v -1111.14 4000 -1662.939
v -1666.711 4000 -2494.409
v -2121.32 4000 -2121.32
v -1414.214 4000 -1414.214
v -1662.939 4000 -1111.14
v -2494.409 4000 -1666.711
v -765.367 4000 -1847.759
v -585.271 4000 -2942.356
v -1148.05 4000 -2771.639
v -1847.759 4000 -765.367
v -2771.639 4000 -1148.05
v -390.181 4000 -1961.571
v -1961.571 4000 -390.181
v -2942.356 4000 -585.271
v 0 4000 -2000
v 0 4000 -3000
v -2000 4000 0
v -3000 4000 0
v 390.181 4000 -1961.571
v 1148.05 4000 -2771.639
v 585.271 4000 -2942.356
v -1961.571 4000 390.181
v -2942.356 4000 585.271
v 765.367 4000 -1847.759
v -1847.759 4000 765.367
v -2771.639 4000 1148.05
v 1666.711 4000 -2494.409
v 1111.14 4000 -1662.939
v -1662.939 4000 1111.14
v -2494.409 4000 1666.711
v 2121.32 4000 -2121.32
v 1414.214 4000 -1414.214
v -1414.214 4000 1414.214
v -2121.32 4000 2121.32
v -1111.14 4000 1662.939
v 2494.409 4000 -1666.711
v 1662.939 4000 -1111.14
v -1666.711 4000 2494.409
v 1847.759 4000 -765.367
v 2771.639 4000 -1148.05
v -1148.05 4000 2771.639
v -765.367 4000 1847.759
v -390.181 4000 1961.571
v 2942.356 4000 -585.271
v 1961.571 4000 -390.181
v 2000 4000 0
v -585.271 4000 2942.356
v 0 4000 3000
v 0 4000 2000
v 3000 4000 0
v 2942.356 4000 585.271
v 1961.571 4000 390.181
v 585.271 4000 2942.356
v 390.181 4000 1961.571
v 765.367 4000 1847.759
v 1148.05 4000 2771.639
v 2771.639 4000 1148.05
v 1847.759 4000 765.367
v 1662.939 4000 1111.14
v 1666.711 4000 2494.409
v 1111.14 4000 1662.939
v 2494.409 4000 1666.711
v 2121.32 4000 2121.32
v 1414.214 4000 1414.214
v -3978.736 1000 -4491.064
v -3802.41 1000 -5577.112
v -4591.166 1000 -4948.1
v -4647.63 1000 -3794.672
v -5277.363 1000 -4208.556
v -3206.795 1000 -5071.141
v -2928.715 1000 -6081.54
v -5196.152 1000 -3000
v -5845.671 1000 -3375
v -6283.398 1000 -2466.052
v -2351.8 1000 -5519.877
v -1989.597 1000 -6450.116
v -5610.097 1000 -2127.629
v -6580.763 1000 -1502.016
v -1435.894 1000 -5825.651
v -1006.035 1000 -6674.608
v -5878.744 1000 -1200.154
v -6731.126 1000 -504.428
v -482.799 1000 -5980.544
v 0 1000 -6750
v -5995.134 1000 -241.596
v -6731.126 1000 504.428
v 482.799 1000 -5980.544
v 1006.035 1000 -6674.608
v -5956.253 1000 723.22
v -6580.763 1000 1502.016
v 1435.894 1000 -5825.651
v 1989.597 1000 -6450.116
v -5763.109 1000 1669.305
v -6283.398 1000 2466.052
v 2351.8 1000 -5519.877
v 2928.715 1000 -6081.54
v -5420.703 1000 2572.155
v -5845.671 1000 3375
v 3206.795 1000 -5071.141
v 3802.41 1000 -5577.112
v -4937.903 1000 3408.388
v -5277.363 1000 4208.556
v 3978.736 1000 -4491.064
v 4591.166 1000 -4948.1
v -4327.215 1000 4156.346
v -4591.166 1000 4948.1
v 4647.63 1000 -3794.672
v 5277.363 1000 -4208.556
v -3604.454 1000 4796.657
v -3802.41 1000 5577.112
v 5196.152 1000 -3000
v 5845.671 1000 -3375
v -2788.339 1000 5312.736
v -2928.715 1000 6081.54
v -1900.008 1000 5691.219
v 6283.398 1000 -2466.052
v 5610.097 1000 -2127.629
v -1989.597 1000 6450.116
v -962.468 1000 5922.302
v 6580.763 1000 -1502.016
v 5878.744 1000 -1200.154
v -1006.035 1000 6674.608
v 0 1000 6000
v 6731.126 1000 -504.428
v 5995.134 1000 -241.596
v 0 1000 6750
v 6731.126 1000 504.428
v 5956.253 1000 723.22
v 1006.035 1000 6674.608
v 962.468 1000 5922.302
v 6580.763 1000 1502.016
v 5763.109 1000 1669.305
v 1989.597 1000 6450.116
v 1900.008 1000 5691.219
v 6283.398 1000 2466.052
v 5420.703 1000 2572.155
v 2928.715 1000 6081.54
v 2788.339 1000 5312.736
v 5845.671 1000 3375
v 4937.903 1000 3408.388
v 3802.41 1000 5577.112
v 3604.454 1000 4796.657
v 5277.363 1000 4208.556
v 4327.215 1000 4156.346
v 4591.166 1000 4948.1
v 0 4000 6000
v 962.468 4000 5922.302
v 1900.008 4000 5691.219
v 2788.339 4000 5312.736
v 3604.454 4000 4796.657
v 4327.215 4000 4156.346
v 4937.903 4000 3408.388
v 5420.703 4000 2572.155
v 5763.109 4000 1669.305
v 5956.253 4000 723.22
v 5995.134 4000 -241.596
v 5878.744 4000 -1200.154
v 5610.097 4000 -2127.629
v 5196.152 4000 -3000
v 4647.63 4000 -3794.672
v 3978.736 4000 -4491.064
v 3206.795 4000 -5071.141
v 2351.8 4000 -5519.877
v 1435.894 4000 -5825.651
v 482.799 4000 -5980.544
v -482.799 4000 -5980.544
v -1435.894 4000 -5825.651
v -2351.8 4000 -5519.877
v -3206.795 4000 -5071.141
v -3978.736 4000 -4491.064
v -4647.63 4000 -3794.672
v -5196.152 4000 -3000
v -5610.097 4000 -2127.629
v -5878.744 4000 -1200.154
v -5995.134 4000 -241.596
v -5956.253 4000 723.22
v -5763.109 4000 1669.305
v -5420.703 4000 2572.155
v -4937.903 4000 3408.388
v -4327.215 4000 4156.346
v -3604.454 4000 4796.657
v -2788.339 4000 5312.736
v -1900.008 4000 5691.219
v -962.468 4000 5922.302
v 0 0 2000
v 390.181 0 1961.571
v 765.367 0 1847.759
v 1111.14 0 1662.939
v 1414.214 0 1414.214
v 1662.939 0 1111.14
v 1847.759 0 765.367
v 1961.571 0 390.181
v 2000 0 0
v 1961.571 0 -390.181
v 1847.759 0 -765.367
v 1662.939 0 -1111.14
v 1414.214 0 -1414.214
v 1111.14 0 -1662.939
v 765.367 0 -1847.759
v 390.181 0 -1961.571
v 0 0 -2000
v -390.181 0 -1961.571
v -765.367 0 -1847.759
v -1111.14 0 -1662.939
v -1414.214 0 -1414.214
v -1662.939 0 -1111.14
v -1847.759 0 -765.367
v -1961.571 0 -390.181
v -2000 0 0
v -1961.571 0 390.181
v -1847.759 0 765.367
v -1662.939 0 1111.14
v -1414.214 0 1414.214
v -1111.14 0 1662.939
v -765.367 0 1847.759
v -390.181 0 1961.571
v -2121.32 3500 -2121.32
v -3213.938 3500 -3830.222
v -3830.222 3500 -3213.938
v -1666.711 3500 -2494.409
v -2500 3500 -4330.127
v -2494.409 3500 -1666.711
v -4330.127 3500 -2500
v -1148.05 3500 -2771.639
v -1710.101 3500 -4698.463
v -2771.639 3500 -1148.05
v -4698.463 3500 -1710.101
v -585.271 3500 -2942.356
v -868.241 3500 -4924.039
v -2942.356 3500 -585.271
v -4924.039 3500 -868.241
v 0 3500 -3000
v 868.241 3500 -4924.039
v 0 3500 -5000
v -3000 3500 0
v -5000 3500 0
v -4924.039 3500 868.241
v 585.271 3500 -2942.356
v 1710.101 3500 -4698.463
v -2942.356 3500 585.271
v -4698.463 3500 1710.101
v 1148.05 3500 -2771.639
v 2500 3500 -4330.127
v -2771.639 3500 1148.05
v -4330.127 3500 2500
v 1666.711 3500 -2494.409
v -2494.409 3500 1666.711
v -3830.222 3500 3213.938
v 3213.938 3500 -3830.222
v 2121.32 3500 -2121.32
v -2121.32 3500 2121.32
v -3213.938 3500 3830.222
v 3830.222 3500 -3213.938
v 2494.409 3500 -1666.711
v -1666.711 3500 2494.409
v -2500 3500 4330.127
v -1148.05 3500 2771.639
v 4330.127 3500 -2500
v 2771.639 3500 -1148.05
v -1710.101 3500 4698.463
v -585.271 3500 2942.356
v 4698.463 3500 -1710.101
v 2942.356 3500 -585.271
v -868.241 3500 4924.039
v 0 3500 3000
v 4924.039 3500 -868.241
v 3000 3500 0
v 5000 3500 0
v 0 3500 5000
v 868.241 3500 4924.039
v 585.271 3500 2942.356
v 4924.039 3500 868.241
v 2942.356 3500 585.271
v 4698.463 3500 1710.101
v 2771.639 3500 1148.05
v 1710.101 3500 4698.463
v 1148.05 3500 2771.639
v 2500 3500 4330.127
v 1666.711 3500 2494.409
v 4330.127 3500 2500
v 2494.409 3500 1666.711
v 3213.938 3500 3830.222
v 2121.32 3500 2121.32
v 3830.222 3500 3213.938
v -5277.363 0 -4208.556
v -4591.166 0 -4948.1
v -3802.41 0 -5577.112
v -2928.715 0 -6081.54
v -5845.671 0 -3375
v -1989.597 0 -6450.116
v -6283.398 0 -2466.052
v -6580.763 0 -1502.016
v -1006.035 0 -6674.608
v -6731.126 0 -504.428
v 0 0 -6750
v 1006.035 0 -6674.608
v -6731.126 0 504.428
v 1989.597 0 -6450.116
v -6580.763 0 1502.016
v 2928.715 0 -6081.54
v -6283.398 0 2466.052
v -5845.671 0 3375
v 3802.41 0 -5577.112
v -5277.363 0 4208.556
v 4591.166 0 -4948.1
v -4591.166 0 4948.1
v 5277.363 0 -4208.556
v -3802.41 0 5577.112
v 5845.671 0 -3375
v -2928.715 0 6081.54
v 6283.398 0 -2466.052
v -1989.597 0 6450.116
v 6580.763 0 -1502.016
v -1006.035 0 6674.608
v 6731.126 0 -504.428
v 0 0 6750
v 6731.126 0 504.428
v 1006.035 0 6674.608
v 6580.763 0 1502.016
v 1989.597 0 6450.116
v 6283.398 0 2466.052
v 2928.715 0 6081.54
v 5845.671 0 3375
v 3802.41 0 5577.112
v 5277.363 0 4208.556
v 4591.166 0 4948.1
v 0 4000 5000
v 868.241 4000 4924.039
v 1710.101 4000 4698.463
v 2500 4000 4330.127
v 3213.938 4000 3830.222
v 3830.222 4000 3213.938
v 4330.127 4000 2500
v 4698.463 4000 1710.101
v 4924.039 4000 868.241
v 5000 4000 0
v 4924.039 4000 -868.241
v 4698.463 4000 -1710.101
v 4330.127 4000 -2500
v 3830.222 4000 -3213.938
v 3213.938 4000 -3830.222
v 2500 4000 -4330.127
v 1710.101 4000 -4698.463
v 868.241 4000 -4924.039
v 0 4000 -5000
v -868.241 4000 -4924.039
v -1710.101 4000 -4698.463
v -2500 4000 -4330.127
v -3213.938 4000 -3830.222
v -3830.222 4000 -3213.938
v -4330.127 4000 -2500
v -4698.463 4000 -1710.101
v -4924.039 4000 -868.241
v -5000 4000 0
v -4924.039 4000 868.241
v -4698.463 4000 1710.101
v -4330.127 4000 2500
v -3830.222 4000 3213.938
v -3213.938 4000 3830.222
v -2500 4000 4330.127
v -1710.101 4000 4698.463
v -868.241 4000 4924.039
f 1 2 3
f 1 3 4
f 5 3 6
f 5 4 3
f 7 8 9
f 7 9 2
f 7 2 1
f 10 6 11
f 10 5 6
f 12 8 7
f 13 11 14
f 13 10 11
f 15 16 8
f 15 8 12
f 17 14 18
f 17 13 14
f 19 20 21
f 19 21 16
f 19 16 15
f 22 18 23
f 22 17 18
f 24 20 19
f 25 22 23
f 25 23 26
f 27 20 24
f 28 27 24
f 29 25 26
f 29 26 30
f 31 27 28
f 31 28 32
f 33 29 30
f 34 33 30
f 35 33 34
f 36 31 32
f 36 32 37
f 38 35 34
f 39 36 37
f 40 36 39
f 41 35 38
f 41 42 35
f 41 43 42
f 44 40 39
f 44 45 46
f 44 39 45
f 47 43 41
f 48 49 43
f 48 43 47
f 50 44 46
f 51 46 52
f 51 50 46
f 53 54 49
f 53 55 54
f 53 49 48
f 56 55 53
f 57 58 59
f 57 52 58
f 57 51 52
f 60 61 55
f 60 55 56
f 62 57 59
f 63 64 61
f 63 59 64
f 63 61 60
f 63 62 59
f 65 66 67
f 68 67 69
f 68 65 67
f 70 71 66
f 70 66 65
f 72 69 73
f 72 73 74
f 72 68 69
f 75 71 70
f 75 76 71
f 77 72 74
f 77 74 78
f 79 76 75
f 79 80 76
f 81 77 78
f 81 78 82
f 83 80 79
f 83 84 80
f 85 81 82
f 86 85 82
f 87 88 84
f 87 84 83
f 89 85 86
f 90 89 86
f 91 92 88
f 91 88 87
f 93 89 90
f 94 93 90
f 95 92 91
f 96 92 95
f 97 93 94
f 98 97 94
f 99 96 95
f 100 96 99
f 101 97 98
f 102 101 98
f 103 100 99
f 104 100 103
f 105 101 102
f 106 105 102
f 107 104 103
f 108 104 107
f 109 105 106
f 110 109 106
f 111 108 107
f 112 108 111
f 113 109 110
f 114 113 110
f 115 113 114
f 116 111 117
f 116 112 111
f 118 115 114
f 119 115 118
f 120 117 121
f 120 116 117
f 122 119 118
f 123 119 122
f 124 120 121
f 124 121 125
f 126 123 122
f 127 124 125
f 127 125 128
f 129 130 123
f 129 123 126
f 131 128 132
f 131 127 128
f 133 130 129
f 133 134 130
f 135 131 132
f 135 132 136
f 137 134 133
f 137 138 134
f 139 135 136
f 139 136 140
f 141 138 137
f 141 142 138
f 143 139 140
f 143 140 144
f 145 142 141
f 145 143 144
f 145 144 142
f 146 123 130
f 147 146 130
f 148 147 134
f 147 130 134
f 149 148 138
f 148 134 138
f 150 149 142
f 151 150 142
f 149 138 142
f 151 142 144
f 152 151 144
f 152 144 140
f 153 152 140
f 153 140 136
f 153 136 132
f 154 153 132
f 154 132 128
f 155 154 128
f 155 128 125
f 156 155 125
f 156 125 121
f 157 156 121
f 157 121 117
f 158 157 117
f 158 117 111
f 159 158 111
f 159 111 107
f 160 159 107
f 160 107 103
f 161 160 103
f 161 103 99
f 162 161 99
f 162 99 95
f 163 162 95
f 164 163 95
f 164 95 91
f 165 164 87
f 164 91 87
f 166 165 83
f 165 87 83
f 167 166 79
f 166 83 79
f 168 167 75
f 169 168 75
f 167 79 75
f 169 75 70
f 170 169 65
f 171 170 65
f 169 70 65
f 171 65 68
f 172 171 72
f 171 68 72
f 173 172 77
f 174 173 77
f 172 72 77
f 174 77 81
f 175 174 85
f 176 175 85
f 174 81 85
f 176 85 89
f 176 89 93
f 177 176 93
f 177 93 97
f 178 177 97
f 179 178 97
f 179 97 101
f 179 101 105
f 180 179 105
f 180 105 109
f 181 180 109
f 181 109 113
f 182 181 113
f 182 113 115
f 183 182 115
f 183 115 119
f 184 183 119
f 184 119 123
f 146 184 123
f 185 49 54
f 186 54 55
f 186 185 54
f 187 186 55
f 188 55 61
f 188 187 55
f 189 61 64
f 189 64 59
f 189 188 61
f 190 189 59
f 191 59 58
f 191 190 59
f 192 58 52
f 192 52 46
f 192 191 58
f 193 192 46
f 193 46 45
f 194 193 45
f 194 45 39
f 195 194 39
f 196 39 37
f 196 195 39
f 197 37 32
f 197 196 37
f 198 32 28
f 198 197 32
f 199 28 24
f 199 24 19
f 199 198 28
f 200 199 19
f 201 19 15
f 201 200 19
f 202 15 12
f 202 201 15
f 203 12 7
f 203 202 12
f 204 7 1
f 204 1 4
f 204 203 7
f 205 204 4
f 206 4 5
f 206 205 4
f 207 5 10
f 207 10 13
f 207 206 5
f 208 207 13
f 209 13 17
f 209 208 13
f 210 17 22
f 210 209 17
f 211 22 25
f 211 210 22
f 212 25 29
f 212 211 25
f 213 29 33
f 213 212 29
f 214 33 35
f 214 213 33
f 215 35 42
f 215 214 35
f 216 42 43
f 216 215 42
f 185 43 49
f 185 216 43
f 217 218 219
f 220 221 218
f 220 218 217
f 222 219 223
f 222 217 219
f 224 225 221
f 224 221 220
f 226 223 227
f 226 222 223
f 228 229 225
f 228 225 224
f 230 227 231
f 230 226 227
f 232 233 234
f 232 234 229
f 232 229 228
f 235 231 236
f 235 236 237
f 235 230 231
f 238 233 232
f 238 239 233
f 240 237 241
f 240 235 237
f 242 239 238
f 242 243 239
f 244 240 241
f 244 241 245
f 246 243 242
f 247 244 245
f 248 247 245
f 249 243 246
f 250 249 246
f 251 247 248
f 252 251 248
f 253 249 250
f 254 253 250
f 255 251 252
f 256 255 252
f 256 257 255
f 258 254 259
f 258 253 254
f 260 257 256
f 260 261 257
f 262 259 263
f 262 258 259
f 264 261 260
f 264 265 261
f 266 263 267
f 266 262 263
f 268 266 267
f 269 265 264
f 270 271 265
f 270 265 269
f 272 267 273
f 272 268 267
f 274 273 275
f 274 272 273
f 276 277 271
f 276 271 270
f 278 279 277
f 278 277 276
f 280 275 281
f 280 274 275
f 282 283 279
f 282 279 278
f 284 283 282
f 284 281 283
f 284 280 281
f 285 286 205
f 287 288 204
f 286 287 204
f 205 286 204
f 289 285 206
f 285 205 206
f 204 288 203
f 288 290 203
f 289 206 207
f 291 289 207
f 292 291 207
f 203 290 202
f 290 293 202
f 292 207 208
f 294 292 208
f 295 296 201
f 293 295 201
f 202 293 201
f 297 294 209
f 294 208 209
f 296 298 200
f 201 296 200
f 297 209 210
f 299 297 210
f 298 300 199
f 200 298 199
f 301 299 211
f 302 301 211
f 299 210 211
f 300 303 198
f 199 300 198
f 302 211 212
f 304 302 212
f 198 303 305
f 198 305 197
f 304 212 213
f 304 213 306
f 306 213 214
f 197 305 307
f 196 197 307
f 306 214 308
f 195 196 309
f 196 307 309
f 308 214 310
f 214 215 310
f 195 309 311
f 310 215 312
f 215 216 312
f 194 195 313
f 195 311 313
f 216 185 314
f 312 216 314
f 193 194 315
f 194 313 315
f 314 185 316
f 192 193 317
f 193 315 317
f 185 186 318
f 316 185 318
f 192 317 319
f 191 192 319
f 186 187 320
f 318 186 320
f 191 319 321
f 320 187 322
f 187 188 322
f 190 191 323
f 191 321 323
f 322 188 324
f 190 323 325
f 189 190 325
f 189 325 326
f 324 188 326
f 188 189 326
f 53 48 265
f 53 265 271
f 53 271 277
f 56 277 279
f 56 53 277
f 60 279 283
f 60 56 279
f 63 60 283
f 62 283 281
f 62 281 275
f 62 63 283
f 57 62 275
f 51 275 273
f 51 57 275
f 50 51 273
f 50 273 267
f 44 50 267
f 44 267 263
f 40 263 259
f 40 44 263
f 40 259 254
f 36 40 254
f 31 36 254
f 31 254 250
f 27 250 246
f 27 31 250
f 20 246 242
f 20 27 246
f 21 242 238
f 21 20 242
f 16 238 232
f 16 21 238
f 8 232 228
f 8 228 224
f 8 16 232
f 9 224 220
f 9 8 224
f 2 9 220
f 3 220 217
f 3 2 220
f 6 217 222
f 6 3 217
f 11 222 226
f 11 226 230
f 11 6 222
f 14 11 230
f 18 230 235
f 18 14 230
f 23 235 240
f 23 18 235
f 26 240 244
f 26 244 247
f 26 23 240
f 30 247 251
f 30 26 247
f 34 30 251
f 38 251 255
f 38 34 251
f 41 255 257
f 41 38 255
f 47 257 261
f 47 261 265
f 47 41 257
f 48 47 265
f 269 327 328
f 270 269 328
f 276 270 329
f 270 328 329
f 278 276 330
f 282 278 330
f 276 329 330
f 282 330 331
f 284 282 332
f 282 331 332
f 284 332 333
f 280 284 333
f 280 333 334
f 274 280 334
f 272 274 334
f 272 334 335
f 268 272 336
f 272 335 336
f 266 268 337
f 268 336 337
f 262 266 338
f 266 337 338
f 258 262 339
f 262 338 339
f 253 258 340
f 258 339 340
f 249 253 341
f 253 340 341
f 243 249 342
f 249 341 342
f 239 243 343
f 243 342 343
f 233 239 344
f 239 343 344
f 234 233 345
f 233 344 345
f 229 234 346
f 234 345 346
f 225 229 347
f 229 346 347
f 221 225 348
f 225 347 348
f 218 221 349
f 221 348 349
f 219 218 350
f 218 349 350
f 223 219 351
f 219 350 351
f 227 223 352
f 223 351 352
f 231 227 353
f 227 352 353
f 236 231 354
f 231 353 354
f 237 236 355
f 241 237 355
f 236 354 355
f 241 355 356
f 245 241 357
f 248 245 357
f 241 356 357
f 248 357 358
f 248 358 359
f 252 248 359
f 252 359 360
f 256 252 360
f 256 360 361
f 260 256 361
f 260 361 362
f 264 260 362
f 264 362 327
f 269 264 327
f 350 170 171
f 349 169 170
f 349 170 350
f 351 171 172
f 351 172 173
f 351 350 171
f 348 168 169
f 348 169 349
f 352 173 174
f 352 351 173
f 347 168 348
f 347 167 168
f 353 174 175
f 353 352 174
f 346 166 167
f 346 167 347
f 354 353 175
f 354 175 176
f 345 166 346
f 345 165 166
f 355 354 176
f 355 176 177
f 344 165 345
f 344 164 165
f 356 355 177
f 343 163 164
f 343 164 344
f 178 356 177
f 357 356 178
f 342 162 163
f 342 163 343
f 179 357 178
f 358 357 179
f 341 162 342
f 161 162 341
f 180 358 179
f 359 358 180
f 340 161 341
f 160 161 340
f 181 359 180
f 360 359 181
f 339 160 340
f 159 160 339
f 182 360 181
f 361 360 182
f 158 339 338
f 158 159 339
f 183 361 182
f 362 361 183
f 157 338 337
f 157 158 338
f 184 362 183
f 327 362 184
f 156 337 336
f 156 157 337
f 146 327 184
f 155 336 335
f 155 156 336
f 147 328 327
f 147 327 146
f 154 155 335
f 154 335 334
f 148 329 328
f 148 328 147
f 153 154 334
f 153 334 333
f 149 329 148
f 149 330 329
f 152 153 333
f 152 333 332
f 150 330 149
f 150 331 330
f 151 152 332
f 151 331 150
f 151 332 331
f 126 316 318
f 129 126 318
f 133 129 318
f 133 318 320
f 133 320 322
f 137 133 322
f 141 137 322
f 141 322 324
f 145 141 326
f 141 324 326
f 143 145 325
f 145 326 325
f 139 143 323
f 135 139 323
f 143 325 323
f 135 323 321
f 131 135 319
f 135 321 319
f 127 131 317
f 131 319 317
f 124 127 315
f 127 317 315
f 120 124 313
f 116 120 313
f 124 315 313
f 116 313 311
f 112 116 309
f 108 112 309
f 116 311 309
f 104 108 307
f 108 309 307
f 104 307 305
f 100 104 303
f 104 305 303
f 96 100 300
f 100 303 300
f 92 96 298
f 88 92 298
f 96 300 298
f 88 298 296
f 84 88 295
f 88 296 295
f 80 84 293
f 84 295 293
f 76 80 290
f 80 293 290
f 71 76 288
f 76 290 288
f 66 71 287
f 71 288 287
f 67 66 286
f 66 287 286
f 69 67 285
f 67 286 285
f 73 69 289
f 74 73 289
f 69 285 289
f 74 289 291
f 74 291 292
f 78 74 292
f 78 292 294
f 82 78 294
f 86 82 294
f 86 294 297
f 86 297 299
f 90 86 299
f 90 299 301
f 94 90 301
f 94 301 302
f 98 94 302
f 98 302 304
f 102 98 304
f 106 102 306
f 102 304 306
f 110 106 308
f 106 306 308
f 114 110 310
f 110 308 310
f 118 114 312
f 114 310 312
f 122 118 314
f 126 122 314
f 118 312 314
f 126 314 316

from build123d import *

# Parameters (mm, degrees)
SKETCH_1_R          = 6000
SKETCH_1_R_2        = 2000
EXTRUDE_1_DEPTH     = 4000
SKETCH_1_3_R        = 6750
SKETCH_1_3_R_2      = 6000
EXTRUDE_2_DEPTH     = 1000
SKETCH_2_R          = 5000
SKETCH_2_R_2        = 3000
CUT_EXTRUDE_1_DEPTH = 500


with BuildPart() as part:
    # 草圖1 → 填料-伸長1 (new body)
    with BuildSketch(Plane(origin=(0, 0, 0), x_dir=(1, 0, 0), z_dir=(0, 1, 0))):
        Circle(SKETCH_1_R)
        Circle(SKETCH_1_R_2, mode=Mode.SUBTRACT)
    extrude(amount=EXTRUDE_1_DEPTH)

    # 草圖1<3> → 填料-伸長2 (add)
    with BuildSketch(Plane(origin=(0, 0, 0), x_dir=(1, 0, 0), z_dir=(0, 1, 0))):
        Circle(SKETCH_1_3_R)
        Circle(SKETCH_1_3_R_2, mode=Mode.SUBTRACT)
    extrude(amount=EXTRUDE_2_DEPTH)

    # 草圖2 → 除料-伸長1 (cut)
    with BuildSketch(Plane(origin=(0, 4000, 0), x_dir=(1, 0, 0), z_dir=(0, 1, 0))):
        Circle(SKETCH_2_R)
        Circle(SKETCH_2_R_2, mode=Mode.SUBTRACT)
    extrude(amount=-CUT_EXTRUDE_1_DEPTH, mode=Mode.SUBTRACT)


solid = part.part
